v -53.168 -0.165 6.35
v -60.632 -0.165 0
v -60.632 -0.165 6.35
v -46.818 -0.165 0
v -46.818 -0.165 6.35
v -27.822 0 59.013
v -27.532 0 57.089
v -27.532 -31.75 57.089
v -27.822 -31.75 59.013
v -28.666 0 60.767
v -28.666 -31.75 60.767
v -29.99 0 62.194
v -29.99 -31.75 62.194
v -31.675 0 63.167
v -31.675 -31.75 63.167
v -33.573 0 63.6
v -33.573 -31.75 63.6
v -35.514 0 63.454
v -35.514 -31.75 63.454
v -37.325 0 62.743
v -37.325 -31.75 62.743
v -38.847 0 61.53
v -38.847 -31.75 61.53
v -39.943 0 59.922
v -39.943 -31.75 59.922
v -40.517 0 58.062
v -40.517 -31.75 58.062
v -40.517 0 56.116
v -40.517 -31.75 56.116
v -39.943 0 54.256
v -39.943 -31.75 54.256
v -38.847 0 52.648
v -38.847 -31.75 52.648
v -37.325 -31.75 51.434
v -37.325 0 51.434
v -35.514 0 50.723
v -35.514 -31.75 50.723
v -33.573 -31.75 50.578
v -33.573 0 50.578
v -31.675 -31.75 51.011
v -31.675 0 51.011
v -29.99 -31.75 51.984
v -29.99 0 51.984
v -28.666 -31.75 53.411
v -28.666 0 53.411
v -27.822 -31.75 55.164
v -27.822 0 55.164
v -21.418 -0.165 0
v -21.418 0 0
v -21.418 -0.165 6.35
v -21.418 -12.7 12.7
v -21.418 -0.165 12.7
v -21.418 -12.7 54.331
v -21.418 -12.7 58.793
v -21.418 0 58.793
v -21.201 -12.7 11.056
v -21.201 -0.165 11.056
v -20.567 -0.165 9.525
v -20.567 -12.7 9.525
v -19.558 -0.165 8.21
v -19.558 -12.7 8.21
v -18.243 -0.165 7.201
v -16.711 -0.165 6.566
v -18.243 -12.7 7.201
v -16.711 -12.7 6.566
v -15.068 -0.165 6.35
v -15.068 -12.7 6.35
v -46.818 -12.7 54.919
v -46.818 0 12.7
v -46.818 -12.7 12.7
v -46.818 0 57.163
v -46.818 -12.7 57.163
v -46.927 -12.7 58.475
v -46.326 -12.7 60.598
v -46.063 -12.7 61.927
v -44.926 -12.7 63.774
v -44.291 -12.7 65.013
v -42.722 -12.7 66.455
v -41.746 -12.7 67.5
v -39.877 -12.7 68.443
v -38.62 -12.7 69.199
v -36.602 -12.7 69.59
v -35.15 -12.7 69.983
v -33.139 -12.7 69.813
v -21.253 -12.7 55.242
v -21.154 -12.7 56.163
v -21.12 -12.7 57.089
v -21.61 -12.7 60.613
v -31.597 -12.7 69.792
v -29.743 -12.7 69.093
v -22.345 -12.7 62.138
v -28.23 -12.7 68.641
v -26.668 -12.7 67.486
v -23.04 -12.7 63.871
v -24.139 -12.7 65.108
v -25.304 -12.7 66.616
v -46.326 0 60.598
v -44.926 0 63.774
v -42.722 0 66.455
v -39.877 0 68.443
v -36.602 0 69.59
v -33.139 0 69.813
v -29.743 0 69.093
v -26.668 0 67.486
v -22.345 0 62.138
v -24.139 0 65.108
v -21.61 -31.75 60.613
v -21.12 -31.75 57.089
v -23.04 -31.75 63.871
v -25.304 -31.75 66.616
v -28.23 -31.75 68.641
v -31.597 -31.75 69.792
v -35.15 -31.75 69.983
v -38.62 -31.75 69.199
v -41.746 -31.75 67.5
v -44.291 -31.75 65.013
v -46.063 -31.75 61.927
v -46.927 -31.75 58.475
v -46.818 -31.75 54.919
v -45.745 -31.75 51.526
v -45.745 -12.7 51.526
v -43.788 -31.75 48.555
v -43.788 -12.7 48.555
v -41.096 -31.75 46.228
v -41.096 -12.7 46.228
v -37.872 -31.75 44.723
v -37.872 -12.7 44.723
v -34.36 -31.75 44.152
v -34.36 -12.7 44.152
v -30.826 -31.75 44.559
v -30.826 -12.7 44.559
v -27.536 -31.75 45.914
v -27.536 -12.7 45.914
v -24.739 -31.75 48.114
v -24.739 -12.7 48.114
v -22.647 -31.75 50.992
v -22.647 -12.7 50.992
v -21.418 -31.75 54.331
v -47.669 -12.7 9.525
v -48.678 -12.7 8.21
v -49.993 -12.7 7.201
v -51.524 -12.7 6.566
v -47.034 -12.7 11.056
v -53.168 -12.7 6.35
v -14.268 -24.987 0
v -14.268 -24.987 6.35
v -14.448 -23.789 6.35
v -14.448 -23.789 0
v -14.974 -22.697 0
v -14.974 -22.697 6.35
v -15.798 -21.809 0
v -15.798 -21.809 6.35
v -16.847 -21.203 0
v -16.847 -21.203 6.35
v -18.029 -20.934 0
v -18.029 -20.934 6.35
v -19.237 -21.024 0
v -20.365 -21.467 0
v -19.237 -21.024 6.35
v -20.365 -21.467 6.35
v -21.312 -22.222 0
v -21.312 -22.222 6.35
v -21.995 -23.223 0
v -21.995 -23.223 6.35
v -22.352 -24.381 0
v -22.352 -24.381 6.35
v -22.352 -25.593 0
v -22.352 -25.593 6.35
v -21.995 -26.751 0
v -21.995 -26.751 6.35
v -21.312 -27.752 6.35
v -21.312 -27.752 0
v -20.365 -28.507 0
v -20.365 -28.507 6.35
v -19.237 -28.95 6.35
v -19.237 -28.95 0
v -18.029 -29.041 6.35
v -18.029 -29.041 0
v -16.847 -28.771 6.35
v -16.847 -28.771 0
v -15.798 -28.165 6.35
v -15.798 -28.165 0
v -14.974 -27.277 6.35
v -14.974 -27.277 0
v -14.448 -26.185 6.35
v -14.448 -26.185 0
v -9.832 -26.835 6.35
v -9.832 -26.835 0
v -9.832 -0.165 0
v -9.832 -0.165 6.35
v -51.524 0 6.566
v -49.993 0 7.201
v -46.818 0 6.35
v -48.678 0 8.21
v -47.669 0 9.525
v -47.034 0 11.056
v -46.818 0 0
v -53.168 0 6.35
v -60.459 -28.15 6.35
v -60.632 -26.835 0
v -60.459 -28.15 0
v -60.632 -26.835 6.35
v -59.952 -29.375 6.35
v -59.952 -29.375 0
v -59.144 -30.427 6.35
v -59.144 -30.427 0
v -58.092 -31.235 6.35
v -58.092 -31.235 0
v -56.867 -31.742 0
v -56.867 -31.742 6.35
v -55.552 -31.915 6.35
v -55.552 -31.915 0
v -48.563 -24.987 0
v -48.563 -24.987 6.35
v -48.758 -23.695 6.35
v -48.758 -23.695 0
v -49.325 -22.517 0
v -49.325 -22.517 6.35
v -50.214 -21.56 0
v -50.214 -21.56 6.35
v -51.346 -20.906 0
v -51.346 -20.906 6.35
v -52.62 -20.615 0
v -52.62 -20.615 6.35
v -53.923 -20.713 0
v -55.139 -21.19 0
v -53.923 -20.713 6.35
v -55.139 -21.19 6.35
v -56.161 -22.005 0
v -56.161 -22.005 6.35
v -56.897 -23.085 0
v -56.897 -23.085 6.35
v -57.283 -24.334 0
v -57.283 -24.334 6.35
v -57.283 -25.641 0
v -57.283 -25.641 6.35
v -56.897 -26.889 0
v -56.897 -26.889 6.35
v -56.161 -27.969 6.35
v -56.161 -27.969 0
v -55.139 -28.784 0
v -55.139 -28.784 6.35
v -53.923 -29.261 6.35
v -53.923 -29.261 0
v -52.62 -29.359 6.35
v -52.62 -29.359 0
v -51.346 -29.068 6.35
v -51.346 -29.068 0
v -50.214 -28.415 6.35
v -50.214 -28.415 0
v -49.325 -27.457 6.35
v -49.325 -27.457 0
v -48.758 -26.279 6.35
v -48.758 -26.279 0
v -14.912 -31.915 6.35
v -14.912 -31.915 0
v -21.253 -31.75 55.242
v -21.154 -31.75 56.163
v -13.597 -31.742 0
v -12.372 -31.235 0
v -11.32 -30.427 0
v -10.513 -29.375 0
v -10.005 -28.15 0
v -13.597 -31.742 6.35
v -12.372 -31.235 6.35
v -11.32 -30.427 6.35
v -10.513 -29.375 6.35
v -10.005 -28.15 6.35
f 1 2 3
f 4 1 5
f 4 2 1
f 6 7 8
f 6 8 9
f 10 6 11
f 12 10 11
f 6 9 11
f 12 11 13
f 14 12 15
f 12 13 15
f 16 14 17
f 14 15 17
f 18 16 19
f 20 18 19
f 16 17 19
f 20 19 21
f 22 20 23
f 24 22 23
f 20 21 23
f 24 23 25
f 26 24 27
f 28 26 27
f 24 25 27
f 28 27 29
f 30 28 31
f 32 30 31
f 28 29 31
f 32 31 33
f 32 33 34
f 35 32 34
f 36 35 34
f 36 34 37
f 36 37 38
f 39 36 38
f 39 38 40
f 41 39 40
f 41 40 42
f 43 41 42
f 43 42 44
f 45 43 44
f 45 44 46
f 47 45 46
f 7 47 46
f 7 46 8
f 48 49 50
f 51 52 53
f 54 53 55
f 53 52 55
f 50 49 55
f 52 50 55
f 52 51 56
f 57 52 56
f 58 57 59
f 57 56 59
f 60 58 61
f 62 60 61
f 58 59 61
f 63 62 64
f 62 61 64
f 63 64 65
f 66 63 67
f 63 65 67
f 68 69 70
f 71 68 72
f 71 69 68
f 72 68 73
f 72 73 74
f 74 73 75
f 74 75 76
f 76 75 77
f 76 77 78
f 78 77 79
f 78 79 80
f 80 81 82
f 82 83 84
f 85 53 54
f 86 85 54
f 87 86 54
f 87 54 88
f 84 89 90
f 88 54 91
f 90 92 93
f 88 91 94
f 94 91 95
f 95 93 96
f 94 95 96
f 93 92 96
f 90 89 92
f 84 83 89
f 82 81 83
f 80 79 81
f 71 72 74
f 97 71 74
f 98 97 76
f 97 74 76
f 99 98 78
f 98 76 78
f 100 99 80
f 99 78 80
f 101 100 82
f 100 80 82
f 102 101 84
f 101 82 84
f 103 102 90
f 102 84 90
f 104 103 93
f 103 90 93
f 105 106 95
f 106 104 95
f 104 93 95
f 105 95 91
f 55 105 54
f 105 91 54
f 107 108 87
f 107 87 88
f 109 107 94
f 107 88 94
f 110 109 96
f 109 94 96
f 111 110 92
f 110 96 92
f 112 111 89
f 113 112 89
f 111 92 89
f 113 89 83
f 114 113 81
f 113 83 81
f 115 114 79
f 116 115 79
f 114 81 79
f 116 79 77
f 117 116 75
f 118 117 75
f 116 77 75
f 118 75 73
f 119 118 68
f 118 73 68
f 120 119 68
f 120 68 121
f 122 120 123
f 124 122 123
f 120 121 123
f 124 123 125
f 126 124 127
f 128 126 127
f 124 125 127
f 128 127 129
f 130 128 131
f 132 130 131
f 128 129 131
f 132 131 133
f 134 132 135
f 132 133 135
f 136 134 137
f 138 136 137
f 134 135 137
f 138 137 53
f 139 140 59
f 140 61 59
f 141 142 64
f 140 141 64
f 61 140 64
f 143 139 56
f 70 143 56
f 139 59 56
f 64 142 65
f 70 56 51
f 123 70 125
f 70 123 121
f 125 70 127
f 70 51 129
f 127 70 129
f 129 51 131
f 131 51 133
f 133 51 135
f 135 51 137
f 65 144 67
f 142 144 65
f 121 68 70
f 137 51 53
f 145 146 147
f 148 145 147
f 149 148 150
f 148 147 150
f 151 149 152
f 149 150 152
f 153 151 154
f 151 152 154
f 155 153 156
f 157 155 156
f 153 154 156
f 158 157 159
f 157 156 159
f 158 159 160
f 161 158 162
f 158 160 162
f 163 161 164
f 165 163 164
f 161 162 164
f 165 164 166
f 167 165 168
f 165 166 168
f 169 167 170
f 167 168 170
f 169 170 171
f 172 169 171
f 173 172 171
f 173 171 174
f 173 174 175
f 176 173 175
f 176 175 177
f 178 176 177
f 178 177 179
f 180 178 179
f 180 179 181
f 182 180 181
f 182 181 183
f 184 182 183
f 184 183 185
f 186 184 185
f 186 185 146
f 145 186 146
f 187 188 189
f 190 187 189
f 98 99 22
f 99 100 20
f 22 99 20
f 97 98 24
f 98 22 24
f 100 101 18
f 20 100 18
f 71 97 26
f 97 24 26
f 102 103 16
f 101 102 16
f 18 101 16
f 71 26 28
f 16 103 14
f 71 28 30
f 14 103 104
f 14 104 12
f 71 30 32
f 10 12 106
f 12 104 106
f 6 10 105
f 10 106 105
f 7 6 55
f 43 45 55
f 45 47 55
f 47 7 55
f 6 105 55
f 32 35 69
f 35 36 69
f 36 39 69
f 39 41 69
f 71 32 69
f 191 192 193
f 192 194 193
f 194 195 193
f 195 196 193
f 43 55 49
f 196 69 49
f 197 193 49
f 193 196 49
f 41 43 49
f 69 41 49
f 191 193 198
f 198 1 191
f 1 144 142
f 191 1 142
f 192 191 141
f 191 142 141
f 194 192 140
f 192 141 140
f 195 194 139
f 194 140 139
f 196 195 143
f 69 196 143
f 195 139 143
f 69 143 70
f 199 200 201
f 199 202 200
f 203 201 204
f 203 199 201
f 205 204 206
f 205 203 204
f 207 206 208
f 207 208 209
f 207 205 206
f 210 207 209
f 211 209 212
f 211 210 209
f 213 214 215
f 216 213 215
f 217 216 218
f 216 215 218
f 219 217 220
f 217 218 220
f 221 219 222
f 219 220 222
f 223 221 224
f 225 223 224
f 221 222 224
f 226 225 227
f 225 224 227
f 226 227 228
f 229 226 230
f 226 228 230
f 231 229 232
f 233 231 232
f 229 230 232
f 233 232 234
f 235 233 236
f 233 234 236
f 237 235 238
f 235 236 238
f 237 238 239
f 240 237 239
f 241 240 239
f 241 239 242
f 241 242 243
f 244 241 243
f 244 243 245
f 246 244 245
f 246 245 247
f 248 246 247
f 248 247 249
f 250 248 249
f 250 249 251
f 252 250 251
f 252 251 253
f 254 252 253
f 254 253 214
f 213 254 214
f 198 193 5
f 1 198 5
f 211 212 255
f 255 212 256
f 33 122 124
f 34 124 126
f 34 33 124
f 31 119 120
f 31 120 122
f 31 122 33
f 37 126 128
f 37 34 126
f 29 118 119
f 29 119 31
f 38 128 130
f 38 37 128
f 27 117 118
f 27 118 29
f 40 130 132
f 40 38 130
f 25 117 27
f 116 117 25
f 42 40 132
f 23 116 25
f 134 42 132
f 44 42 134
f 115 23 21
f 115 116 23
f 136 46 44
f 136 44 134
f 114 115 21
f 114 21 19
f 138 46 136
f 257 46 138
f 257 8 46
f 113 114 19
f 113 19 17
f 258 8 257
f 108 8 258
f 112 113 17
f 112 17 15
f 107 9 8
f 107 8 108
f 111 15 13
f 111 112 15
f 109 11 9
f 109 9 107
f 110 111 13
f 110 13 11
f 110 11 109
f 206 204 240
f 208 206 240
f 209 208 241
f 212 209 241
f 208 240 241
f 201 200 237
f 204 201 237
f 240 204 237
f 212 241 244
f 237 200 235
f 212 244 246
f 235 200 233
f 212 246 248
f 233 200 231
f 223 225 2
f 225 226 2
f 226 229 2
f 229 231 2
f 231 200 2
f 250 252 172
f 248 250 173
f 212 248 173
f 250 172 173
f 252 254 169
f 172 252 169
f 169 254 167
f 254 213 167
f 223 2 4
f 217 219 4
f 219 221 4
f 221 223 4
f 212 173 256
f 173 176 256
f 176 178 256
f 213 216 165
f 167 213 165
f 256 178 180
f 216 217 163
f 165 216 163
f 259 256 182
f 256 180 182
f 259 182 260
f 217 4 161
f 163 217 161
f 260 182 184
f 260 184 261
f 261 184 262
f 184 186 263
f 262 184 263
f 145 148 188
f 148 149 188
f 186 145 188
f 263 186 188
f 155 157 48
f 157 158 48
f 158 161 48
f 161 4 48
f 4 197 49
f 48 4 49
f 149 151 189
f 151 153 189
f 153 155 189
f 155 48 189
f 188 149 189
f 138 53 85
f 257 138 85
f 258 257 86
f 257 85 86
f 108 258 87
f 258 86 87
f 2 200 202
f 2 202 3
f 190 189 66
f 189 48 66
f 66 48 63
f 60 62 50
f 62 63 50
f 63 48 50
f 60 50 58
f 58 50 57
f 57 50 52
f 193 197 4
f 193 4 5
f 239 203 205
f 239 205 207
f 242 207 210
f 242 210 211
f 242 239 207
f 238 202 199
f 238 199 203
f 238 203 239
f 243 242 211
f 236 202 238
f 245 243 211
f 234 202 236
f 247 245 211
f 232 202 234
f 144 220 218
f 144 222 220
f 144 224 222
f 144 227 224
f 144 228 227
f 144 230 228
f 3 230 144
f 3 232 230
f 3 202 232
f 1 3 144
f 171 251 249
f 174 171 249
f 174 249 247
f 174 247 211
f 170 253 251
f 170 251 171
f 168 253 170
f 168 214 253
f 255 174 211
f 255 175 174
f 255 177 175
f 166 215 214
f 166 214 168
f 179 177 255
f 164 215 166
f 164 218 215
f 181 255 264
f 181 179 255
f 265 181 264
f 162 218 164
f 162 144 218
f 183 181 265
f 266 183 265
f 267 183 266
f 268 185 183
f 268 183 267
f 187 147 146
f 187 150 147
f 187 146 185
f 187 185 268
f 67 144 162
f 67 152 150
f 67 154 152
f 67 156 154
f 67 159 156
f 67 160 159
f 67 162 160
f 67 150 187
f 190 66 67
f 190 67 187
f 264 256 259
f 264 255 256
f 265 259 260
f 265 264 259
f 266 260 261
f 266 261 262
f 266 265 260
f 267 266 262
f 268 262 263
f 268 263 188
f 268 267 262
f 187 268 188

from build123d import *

# Parameters (mm, degrees)
F0_W      = 25.4
F0_H      = 69.85
F1_DEPTH  = 12.7
F3_DEPTH  = 12.701
F5_DEPTH  = 19.05
F6_R      = 6.5291939121
F7_DEPTH  = 31.751
F8_W      = 50.8
F8_H      = 31.75
F9_DEPTH  = 6.35
F10_R     = 4.3841328913
F10_R_2   = 4.0648477918
F11_DEPTH = 25.4
F13_DEPTH = 141
F14_R     = 5.08
F15_W     = 12.5349015713
F15_H     = 9.3853002578
F16_DEPTH = 12.7
F18_DEPTH = 25.4
F20_DEPTH = 12.7
F22_DEPTH = 25.4
F24_DEPTH = 25.4


# Not quite as in the source:
# - an extrude ends at something that could not be found from the text; its depth is read off the source's solid
# - a feature names something its author has since deleted; it is built from what else it names


with BuildPart() as f1:
    # F0 (on Front) → F1 (new body)
    with BuildSketch(Plane.XZ):
        with Locations((-34.1177975344, 34.925)):
            Rectangle(F0_W, F0_H)
    extrude(amount=F1_DEPTH)

    # F2 (on face) → F3 (cut, through all)
    with BuildSketch(Plane.XZ.offset(12.7)):
        with BuildLine():
            ThreePointArc((-46.8177975344, 57.1627020836), (-34.8779343498, 69.8199859011), (-21.4177975344, 58.7931149299))
            Line((-21.4177975344, 58.7931149299), (-21.4177975344, 69.85))
            Line((-21.4177975344, 69.85), (-46.8177975344, 69.85))
            Line((-46.8177975344, 69.85), (-46.8177975344, 57.1627020836))
        make_face()
    extrude(amount=-F3_DEPTH, mode=Mode.SUBTRACT)

    # F4 (on face) → F5 (join)
    with BuildSketch(Plane.XZ.offset(12.7)):
        with BuildLine():
            Line((-46.8177975344, 57.1627020836), (-46.8177975344, 54.9187152869))
            ThreePointArc((-46.8177975344, 54.9187152869), (-34.3603071914, 44.1520357407), (-21.4177975344, 54.3305374906))
            Line((-21.4177975344, 54.3305374906), (-21.4177975344, 58.7931149299))
            ThreePointArc((-21.4177975344, 58.7931149299), (-34.8779343498, 69.8199859011), (-46.8177975344, 57.1627020836))
        make_face()
        with BuildLine():
            ThreePointArc((-21.4177975344, 54.3305374906), (-21.194958074, 55.7017298658), (-21.1203918045, 57.0889089552))
            ThreePointArc((-21.1203918045, 57.0889089552), (-35.1496925912, 69.9833496353), (-46.8177975344, 54.9187152869))
            Line((-46.8177975344, 54.9187152869), (-46.8177975344, 57.1627020836))
            ThreePointArc((-46.8177975344, 57.1627020836), (-34.8779343498, 69.8199859011), (-21.4177975344, 58.7931149299))
            Line((-21.4177975344, 58.7931149299), (-21.4177975344, 54.3305374906))
        make_face()
    extrude(amount=F5_DEPTH)

    # F6 (on face) → F7 (cut, through all)
    with BuildSketch(Plane.XZ.offset(31.75)):
        with Locations((-34.0607331136, 57.0889089552)):
            Circle(F6_R)
    extrude(amount=-F7_DEPTH, mode=Mode.SUBTRACT)

    # F8 (on Top) → F9 (join)
    with BuildSketch(Plane.XY):
        with Locations((-35.2321754485, -16.0400984287)):
            Rectangle(F8_W, F8_H)
    extrude(amount=F9_DEPTH)

    # F10 (on face) → F11 (cut)
    with BuildSketch(Plane.XY.offset(6.35)):
        with Locations((-52.9474318027, -24.9871537089)):
            Circle(F10_R)
        with Locations((-18.3323584497, -24.9871537089)):
            Circle(F10_R_2)
    extrude(amount=-F11_DEPTH, mode=Mode.SUBTRACT)

    # F12 (on Front) → F13 (cut, through all)
    with BuildSketch(Plane.XZ):
        with BuildLine():
            ThreePointArc((-47.1297007382, 13.1953000858), (-48.9895726777, 17.6854281464), (-53.4797007382, 19.5453000858))
            ThreePointArc((-53.4797007382, 19.5453000858), (-57.9698287987, 17.6854281464), (-59.8297007382, 13.1953000858))
            ThreePointArc((-59.8297007382, 13.1953000858), (-57.9698287987, 8.7051720253), (-53.4797007382, 6.8453000858))
            ThreePointArc((-53.4797007382, 6.8453000858), (-48.9895726777, 8.7051720253), (-47.1297007382, 13.1953000858))
        make_face()
        with BuildLine():
            ThreePointArc((-59.8297007382, 13.1953000858), (-57.9698287987, 17.6854281464), (-53.4797007382, 19.5453000858))
            Line((-53.4797007382, 19.5453000858), (-59.8297007382, 19.5453000858))
            Line((-59.8297007382, 19.5453000858), (-59.8297007382, 13.1953000858))
        make_face()
        with BuildLine():
            ThreePointArc((-53.4797007382, 6.8453000858), (-57.9698287987, 8.7051720253), (-59.8297007382, 13.1953000858))
            Line((-59.8297007382, 13.1953000858), (-59.8297007382, 6.8453000858))
            Line((-59.8297007382, 6.8453000858), (-53.4797007382, 6.8453000858))
        make_face()
        with BuildLine():
            Line((-47.1297007382, 13.1953000858), (-47.1297007382, 19.5453000858))
            Line((-47.1297007382, 19.5453000858), (-53.4797007382, 19.5453000858))
            ThreePointArc((-53.4797007382, 19.5453000858), (-48.9895726777, 17.6854281464), (-47.1297007382, 13.1953000858))
        make_face()
        with BuildLine():
            ThreePointArc((-8.7253203213, 12.5349001028), (-14.8973108068, 18.7068905883), (-21.0693012923, 12.5349001028))
            ThreePointArc((-21.0693012923, 12.5349001028), (-19.2615671325, 8.170643777), (-14.8973108068, 6.3629096172))
            ThreePointArc((-14.8973108068, 6.3629096172), (-10.533054481, 8.170643777), (-8.7253203213, 12.5349001028))
        make_face()
    extrude(amount=-F13_DEPTH, mode=Mode.SUBTRACT)

    # F14
    f14_edges = [f1.edges().sort_by_distance(p)[0] for p in [
        (-9.832175, -31.915098, 3.175),
        (-60.632175, -31.915098, 3.175),
    ]]
    fillet(f14_edges, radius=F14_R)

    # F15 (on face) → F16 (join)
    with BuildSketch(Plane.YZ.offset(-21.4177975344)):
        with Locations((-6.4325492144, 11.0426501289)):
            Rectangle(F15_W, F15_H)
    extrude(amount=F16_DEPTH)

    # F17 (on face) → F18 (cut)
    with BuildSketch(Plane.XZ.offset(12.7)):
        with BuildLine():
            ThreePointArc((-20.6453823473, 15.7353002578), (-21.221664756, 14.2660198655), (-21.4177975344, 12.7))
            ThreePointArc((-21.4177975344, 12.7), (-19.5579255949, 8.2098719395), (-15.0677975344, 6.35))
            ThreePointArc((-15.0677975344, 6.35), (-10.5776694739, 8.2098719395), (-8.7177975344, 12.7))
            ThreePointArc((-8.7177975344, 12.7), (-8.9139303128, 14.2660198655), (-9.4902127215, 15.7353002578))
            Line((-9.4902127215, 15.7353002578), (-20.6453823473, 15.7353002578))
        make_face()
        with BuildLine():
            ThreePointArc((-9.4902127215, 15.7353002578), (-15.0677975344, 19.05), (-20.6453823473, 15.7353002578))
            Line((-20.6453823473, 15.7353002578), (-9.4902127215, 15.7353002578))
        make_face()
        with BuildLine():
            ThreePointArc((-8.7177975344, 12.7), (-10.5776694739, 8.2098719395), (-15.0677975344, 6.35))
            Line((-15.0677975344, 6.35), (-9.8321754485, 6.35))
            Line((-9.8321754485, 6.35), (-8.7177975344, 6.35))
            Line((-8.7177975344, 6.35), (-8.7177975344, 12.7))
        make_face()
        with BuildLine():
            Line((-8.7177975344, 15.7353002578), (-9.4902127215, 15.7353002578))
            ThreePointArc((-9.4902127215, 15.7353002578), (-8.9139303128, 14.2660198655), (-8.7177975344, 12.7))
            Line((-8.7177975344, 12.7), (-8.7177975344, 15.7353002578))
        make_face()
    extrude(amount=-F18_DEPTH, mode=Mode.SUBTRACT)

    # F19 (on face) → F20 (join)
    with BuildSketch(Plane(origin=(-46.8177975344, 0, 0), x_dir=(0, -1, 0), z_dir=(-1, 0, 0))):
        Polygon((12.7, 16.4465010166), (0, 16.4465010166), (0, 6.35), (0.1650984287, 6.35), (12.7, 6.35), align=None)
    extrude(amount=F20_DEPTH)

    # F21 (on face) → F22 (cut)
    with BuildSketch(Plane.XZ.offset(12.7)):
        with BuildLine():
            Line((-59.5177975344, 6.35), (-53.1677975344, 6.35))
            ThreePointArc((-53.1677975344, 6.35), (-57.6579255949, 8.2098719395), (-59.5177975344, 12.7))
            Line((-59.5177975344, 12.7), (-59.5177975344, 6.35))
        make_face()
        with BuildLine():
            Line((-21.4177975344, 15.7353002578), (-21.4177975344, 12.7))
            ThreePointArc((-21.4177975344, 12.7), (-21.221664756, 14.2660198655), (-20.6453823473, 15.7353002578))
            Line((-20.6453823473, 15.7353002578), (-21.4177975344, 15.7353002578))
        make_face()
        with BuildLine():
            ThreePointArc((-59.5177975344, 12.7), (-59.204311952, 14.6705313207), (-58.2948073971, 16.4465010166))
            Line((-58.2948073971, 16.4465010166), (-59.5177975344, 16.4465010166))
            Line((-59.5177975344, 16.4465010166), (-59.5177975344, 12.7))
        make_face()
        with BuildLine():
            Line((-58.2948073971, 16.4465010166), (-48.0407876717, 16.4465010166))
            ThreePointArc((-48.0407876717, 16.4465010166), (-53.1677975344, 19.05), (-58.2948073971, 16.4465010166))
        make_face()
        with BuildLine():
            ThreePointArc((-53.1677975344, 6.35), (-48.6776694739, 8.2098719395), (-46.8177975344, 12.7))
            ThreePointArc((-46.8177975344, 12.7), (-47.1312831168, 14.6705313207), (-48.0407876717, 16.4465010166))
            Line((-48.0407876717, 16.4465010166), (-58.2948073971, 16.4465010166))
            ThreePointArc((-58.2948073971, 16.4465010166), (-59.204311952, 14.6705313207), (-59.5177975344, 12.7))
            ThreePointArc((-59.5177975344, 12.7), (-57.6579255949, 8.2098719395), (-53.1677975344, 6.35))
        make_face()
    extrude(amount=-F22_DEPTH, mode=Mode.SUBTRACT)

    # F23 (on face) → F24 (cut)
    with BuildSketch(Plane.XZ.offset(12.7)):
        with BuildLine():
            Line((-46.8177975344, 12.7), (-46.8177975344, 16.4465010166))
            Line((-46.8177975344, 16.4465010166), (-48.0407876717, 16.4465010166))
            ThreePointArc((-48.0407876717, 16.4465010166), (-47.1312831168, 14.6705313207), (-46.8177975344, 12.7))
        make_face()
    extrude(amount=-F24_DEPTH, mode=Mode.SUBTRACT)


solid = f1.part
